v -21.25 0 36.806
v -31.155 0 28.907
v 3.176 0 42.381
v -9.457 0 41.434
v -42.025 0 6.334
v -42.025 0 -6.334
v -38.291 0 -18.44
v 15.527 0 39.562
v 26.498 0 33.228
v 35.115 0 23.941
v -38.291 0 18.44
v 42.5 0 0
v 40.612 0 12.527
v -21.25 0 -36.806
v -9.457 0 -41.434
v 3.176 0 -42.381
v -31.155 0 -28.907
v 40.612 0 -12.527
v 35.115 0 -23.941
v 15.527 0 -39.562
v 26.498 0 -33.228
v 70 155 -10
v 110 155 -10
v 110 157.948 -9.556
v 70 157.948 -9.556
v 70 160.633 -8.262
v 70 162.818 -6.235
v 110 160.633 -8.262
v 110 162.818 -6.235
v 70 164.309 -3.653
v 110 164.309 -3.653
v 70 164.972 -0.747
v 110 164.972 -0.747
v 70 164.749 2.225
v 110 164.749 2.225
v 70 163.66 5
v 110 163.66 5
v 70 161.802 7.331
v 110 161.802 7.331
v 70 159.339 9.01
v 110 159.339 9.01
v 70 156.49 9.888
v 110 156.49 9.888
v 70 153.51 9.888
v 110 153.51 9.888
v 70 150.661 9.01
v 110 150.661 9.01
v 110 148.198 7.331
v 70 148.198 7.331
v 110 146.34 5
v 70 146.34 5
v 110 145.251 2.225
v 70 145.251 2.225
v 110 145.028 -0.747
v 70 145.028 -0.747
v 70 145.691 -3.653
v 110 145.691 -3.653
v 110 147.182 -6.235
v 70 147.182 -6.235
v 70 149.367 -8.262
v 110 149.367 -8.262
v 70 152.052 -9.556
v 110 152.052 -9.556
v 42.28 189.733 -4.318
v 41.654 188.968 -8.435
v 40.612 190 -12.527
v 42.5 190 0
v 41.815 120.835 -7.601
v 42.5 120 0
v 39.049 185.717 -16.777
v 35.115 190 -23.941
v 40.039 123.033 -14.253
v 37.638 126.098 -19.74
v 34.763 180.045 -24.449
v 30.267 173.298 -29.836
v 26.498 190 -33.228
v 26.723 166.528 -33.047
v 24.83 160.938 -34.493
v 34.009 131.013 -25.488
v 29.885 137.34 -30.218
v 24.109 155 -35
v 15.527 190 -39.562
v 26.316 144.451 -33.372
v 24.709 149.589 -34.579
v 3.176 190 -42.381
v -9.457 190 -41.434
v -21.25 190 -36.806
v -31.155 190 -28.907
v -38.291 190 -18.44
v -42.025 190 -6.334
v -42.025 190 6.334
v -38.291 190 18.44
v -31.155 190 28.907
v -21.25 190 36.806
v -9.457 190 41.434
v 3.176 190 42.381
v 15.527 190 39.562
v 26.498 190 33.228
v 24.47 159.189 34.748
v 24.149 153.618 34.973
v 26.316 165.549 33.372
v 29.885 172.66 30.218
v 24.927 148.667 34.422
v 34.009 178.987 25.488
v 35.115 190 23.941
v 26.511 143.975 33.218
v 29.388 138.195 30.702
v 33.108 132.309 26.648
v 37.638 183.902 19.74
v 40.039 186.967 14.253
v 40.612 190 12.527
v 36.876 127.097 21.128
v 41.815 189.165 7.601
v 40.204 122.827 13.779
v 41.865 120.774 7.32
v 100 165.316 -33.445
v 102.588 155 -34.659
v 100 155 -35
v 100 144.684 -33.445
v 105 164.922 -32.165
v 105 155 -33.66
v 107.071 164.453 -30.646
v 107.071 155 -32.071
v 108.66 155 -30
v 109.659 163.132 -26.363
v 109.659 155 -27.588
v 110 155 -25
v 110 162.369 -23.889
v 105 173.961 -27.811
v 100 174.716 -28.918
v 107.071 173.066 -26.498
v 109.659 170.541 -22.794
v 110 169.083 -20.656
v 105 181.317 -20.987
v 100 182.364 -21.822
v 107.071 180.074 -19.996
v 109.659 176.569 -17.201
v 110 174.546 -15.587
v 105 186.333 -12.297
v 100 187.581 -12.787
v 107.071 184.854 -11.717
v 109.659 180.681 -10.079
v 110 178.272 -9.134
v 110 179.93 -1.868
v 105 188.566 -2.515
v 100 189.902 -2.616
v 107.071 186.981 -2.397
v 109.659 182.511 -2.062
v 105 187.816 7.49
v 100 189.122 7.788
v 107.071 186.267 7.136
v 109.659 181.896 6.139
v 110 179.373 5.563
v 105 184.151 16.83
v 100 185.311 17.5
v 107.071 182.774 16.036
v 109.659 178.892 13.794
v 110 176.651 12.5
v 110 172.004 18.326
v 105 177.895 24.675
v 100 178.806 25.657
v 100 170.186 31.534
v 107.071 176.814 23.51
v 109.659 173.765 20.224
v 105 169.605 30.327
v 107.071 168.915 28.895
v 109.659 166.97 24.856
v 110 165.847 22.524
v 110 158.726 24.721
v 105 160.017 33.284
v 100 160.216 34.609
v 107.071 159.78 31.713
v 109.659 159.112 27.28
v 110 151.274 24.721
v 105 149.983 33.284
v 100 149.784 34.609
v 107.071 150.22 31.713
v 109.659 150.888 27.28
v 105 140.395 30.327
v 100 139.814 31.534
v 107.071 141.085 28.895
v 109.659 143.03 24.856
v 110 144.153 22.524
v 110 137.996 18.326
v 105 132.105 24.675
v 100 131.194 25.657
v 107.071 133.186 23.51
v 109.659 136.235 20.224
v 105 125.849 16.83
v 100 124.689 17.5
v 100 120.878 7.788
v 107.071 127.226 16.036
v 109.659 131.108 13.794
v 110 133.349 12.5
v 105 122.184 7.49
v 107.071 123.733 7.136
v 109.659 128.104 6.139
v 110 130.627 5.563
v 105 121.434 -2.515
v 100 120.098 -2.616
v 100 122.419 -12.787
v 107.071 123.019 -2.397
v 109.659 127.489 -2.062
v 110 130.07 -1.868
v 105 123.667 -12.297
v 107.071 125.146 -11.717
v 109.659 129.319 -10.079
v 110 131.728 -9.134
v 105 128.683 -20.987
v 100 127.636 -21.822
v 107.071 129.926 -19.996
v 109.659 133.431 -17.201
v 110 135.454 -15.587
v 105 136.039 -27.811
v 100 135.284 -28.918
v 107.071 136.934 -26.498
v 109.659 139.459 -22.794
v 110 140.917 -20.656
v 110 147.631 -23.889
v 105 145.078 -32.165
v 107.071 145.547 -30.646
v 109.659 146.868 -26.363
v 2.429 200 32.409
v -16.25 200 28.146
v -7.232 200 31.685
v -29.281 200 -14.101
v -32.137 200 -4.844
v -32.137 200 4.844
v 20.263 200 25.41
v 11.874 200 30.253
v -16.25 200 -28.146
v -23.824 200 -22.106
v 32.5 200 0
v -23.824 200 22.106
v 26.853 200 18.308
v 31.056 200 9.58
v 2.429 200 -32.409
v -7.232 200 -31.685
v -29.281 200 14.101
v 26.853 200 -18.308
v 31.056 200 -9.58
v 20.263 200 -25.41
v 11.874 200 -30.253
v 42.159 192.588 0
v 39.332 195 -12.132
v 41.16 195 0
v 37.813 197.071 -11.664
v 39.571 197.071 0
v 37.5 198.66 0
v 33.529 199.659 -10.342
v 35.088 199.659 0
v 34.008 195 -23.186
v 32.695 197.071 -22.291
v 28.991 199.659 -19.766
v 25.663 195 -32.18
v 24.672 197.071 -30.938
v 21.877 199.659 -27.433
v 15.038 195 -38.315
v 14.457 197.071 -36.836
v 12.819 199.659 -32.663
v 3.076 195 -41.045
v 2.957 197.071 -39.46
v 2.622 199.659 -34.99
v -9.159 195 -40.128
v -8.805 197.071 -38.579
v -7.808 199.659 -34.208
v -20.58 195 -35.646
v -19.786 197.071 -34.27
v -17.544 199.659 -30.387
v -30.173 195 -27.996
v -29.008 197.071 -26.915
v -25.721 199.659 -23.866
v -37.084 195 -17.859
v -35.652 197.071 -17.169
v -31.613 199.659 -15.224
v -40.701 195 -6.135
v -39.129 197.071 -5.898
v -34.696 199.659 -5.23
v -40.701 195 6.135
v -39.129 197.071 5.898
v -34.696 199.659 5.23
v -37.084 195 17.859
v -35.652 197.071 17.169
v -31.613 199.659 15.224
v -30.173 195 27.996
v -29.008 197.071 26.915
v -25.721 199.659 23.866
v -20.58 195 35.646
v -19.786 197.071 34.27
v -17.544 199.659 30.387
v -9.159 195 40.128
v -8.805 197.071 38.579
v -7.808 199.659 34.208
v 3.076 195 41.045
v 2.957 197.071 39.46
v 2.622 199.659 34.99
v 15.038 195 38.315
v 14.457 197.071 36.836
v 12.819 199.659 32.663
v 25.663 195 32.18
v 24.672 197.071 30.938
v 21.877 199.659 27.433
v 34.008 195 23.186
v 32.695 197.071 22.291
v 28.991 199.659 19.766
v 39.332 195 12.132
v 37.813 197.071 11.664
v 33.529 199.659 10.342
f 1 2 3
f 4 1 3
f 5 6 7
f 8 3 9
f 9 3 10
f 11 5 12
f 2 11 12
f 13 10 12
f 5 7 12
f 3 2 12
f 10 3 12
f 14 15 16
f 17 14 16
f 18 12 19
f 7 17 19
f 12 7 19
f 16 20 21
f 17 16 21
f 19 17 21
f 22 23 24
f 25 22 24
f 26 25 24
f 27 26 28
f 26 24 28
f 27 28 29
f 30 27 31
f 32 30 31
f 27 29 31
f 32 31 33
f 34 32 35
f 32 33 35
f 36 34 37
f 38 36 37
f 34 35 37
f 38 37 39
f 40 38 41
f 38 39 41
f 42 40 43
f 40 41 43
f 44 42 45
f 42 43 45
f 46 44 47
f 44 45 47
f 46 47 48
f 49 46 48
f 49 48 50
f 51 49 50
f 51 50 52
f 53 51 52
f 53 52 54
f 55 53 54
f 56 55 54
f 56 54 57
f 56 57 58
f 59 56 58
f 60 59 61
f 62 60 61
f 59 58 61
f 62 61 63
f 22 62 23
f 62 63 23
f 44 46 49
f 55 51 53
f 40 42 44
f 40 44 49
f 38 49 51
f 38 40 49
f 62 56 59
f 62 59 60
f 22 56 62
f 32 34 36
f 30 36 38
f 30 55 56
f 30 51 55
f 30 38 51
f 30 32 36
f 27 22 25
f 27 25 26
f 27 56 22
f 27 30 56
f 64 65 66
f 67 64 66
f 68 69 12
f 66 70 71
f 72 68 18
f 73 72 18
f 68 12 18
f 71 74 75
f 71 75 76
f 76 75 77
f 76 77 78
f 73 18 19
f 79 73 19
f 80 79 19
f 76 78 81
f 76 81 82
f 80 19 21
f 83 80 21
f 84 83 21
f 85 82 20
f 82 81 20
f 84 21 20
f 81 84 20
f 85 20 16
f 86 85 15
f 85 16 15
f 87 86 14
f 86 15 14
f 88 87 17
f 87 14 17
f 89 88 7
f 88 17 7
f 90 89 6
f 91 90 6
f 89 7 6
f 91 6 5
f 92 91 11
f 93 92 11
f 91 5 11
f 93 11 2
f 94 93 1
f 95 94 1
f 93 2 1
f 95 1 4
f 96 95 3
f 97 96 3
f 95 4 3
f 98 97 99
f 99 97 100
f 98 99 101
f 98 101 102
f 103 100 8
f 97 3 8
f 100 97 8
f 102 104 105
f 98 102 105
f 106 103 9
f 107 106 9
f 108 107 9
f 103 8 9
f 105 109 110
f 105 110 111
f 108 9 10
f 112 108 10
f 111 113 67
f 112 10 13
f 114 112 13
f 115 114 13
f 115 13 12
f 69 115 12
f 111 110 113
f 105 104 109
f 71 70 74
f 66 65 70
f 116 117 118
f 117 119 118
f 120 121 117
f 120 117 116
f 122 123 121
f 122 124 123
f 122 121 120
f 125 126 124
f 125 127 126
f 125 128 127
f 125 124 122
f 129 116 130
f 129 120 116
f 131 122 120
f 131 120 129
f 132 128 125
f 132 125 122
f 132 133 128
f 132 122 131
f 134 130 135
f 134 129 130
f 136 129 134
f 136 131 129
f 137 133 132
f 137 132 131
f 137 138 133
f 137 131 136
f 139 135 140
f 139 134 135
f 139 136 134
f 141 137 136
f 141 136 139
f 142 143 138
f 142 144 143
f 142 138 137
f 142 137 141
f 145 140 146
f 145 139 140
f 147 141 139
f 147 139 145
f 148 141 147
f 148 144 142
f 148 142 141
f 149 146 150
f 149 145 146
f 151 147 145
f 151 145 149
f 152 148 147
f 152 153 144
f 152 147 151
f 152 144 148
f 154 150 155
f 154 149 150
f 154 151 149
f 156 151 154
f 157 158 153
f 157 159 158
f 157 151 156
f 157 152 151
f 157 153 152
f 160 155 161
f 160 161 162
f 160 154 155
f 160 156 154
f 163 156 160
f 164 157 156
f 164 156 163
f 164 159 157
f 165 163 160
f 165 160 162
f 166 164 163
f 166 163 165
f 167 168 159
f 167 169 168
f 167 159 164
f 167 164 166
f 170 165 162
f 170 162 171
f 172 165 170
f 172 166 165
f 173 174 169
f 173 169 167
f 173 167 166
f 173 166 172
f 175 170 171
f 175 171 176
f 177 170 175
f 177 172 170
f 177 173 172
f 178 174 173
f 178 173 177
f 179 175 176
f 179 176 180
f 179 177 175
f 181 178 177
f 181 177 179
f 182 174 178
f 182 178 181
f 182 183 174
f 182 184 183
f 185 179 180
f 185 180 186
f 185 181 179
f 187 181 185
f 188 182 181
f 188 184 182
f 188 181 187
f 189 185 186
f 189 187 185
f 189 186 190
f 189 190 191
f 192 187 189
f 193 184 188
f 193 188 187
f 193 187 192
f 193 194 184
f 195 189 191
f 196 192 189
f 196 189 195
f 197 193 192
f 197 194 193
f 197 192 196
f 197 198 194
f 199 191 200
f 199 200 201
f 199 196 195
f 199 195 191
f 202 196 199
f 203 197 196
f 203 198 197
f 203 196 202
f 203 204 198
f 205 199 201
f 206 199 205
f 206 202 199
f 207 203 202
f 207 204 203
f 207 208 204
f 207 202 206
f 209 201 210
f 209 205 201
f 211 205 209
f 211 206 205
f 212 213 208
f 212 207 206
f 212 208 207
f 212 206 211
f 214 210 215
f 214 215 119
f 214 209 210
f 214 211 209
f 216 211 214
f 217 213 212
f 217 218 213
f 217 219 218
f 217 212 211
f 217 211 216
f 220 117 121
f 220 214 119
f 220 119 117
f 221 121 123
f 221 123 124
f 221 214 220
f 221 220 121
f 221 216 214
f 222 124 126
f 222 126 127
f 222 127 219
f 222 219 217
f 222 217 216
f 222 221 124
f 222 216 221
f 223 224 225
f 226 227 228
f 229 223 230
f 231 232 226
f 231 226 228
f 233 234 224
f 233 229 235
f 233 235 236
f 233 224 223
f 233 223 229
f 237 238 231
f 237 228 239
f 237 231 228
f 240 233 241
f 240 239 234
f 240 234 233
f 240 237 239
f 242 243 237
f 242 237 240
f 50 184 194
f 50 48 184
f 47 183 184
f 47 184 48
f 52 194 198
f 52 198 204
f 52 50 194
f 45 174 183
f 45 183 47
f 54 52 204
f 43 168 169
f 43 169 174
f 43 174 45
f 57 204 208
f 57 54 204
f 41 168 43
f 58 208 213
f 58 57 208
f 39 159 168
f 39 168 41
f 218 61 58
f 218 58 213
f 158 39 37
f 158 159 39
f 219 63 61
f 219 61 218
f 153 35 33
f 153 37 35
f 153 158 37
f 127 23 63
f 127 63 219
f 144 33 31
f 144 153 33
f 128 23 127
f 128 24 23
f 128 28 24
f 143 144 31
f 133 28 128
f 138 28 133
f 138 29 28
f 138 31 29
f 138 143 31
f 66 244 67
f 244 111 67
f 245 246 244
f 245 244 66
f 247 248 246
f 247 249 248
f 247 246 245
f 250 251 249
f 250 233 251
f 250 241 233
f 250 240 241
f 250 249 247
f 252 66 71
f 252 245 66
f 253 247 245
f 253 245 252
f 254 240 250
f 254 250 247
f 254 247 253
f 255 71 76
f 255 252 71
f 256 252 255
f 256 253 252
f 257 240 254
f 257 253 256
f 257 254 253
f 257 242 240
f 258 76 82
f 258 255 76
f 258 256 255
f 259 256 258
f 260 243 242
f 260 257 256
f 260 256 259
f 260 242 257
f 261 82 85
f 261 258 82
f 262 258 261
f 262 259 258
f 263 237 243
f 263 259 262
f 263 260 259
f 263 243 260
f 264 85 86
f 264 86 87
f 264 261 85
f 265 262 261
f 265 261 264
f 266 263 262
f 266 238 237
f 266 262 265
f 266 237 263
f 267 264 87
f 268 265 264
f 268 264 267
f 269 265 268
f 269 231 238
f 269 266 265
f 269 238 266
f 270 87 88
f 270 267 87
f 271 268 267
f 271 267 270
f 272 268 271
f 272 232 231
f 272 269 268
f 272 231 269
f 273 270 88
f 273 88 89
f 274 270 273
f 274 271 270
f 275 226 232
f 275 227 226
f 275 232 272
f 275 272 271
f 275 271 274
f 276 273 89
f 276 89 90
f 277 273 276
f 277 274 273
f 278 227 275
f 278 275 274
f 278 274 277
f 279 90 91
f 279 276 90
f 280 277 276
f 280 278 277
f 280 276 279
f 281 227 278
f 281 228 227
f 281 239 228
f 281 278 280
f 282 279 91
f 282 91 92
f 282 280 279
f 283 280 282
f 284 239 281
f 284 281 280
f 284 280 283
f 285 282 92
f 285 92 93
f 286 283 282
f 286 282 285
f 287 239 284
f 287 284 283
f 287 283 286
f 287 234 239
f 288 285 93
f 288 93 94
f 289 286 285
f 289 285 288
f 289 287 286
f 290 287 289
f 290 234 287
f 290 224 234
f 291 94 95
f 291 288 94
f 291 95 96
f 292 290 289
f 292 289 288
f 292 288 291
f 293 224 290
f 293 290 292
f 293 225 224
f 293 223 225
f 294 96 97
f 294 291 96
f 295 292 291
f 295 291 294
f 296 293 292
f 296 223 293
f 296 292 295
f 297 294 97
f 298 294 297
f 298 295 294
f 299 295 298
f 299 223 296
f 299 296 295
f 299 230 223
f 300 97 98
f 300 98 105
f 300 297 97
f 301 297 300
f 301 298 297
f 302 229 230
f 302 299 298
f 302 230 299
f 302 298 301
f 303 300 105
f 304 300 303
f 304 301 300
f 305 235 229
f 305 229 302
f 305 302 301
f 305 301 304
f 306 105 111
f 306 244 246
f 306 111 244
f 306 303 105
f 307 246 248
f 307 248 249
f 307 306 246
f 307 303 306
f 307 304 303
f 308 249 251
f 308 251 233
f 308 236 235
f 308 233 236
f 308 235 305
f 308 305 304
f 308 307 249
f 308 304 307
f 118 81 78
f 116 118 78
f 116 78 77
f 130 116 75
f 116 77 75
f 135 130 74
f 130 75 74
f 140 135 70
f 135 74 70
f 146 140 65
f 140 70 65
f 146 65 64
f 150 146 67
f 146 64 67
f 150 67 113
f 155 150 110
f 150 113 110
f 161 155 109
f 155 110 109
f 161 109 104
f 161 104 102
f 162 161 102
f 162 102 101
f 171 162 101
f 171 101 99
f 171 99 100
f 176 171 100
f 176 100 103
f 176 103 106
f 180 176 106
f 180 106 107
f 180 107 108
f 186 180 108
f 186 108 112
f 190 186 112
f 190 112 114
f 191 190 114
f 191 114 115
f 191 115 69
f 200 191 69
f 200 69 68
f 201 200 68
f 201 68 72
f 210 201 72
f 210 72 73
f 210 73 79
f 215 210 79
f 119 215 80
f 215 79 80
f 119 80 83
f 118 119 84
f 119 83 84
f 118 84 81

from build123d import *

# Parameters (mm, degrees)
SKETCH1_R           = 42.5
BOSS_EXTRUDE1_DEPTH = 200
SKETCH2_R           = 35
BOSS_EXTRUDE2_DEPTH = 110
FILLET1_R           = 10
SKETCH3_R           = 10
CUT_EXTRUDE1_DEPTH  = 40
FILLET2_R           = 10


with BuildPart() as part:
    # Sketch1 → Boss-Extrude1 (new body)
    with BuildSketch(Plane(origin=(0, 0, 0), x_dir=(1, 0, 0), z_dir=(0, 1, 0))):
        Circle(SKETCH1_R)
    extrude(amount=BOSS_EXTRUDE1_DEPTH)

    # Sketch2 → Boss-Extrude2 (add)
    with BuildSketch(Plane(origin=(0, 0, 0), x_dir=(0, 0, -1), z_dir=(1, 0, 0))):
        with Locations((0, 155)):
            Circle(SKETCH2_R)
    extrude(amount=BOSS_EXTRUDE2_DEPTH)

    # Fillet1
    fillet1_edges = [part.edges().sort_by_distance(p)[0] for p in [
        (-42.5, 200, 0),
    ]]
    fillet(fillet1_edges, radius=FILLET1_R)

    # Sketch3 → Cut-Extrude1 (cut)
    with BuildSketch(Plane(origin=(110, 0, 0), x_dir=(0, 0, -1), z_dir=(1, 0, 0))):
        with Locations((0, 155)):
            Circle(SKETCH3_R)
    extrude(amount=-CUT_EXTRUDE1_DEPTH, mode=Mode.SUBTRACT)

    # Fillet2
    fillet2_edges = [part.edges().sort_by_distance(p)[0] for p in [
        (110, 155, 35),
    ]]
    fillet(fillet2_edges, radius=FILLET2_R)


solid = part.part
